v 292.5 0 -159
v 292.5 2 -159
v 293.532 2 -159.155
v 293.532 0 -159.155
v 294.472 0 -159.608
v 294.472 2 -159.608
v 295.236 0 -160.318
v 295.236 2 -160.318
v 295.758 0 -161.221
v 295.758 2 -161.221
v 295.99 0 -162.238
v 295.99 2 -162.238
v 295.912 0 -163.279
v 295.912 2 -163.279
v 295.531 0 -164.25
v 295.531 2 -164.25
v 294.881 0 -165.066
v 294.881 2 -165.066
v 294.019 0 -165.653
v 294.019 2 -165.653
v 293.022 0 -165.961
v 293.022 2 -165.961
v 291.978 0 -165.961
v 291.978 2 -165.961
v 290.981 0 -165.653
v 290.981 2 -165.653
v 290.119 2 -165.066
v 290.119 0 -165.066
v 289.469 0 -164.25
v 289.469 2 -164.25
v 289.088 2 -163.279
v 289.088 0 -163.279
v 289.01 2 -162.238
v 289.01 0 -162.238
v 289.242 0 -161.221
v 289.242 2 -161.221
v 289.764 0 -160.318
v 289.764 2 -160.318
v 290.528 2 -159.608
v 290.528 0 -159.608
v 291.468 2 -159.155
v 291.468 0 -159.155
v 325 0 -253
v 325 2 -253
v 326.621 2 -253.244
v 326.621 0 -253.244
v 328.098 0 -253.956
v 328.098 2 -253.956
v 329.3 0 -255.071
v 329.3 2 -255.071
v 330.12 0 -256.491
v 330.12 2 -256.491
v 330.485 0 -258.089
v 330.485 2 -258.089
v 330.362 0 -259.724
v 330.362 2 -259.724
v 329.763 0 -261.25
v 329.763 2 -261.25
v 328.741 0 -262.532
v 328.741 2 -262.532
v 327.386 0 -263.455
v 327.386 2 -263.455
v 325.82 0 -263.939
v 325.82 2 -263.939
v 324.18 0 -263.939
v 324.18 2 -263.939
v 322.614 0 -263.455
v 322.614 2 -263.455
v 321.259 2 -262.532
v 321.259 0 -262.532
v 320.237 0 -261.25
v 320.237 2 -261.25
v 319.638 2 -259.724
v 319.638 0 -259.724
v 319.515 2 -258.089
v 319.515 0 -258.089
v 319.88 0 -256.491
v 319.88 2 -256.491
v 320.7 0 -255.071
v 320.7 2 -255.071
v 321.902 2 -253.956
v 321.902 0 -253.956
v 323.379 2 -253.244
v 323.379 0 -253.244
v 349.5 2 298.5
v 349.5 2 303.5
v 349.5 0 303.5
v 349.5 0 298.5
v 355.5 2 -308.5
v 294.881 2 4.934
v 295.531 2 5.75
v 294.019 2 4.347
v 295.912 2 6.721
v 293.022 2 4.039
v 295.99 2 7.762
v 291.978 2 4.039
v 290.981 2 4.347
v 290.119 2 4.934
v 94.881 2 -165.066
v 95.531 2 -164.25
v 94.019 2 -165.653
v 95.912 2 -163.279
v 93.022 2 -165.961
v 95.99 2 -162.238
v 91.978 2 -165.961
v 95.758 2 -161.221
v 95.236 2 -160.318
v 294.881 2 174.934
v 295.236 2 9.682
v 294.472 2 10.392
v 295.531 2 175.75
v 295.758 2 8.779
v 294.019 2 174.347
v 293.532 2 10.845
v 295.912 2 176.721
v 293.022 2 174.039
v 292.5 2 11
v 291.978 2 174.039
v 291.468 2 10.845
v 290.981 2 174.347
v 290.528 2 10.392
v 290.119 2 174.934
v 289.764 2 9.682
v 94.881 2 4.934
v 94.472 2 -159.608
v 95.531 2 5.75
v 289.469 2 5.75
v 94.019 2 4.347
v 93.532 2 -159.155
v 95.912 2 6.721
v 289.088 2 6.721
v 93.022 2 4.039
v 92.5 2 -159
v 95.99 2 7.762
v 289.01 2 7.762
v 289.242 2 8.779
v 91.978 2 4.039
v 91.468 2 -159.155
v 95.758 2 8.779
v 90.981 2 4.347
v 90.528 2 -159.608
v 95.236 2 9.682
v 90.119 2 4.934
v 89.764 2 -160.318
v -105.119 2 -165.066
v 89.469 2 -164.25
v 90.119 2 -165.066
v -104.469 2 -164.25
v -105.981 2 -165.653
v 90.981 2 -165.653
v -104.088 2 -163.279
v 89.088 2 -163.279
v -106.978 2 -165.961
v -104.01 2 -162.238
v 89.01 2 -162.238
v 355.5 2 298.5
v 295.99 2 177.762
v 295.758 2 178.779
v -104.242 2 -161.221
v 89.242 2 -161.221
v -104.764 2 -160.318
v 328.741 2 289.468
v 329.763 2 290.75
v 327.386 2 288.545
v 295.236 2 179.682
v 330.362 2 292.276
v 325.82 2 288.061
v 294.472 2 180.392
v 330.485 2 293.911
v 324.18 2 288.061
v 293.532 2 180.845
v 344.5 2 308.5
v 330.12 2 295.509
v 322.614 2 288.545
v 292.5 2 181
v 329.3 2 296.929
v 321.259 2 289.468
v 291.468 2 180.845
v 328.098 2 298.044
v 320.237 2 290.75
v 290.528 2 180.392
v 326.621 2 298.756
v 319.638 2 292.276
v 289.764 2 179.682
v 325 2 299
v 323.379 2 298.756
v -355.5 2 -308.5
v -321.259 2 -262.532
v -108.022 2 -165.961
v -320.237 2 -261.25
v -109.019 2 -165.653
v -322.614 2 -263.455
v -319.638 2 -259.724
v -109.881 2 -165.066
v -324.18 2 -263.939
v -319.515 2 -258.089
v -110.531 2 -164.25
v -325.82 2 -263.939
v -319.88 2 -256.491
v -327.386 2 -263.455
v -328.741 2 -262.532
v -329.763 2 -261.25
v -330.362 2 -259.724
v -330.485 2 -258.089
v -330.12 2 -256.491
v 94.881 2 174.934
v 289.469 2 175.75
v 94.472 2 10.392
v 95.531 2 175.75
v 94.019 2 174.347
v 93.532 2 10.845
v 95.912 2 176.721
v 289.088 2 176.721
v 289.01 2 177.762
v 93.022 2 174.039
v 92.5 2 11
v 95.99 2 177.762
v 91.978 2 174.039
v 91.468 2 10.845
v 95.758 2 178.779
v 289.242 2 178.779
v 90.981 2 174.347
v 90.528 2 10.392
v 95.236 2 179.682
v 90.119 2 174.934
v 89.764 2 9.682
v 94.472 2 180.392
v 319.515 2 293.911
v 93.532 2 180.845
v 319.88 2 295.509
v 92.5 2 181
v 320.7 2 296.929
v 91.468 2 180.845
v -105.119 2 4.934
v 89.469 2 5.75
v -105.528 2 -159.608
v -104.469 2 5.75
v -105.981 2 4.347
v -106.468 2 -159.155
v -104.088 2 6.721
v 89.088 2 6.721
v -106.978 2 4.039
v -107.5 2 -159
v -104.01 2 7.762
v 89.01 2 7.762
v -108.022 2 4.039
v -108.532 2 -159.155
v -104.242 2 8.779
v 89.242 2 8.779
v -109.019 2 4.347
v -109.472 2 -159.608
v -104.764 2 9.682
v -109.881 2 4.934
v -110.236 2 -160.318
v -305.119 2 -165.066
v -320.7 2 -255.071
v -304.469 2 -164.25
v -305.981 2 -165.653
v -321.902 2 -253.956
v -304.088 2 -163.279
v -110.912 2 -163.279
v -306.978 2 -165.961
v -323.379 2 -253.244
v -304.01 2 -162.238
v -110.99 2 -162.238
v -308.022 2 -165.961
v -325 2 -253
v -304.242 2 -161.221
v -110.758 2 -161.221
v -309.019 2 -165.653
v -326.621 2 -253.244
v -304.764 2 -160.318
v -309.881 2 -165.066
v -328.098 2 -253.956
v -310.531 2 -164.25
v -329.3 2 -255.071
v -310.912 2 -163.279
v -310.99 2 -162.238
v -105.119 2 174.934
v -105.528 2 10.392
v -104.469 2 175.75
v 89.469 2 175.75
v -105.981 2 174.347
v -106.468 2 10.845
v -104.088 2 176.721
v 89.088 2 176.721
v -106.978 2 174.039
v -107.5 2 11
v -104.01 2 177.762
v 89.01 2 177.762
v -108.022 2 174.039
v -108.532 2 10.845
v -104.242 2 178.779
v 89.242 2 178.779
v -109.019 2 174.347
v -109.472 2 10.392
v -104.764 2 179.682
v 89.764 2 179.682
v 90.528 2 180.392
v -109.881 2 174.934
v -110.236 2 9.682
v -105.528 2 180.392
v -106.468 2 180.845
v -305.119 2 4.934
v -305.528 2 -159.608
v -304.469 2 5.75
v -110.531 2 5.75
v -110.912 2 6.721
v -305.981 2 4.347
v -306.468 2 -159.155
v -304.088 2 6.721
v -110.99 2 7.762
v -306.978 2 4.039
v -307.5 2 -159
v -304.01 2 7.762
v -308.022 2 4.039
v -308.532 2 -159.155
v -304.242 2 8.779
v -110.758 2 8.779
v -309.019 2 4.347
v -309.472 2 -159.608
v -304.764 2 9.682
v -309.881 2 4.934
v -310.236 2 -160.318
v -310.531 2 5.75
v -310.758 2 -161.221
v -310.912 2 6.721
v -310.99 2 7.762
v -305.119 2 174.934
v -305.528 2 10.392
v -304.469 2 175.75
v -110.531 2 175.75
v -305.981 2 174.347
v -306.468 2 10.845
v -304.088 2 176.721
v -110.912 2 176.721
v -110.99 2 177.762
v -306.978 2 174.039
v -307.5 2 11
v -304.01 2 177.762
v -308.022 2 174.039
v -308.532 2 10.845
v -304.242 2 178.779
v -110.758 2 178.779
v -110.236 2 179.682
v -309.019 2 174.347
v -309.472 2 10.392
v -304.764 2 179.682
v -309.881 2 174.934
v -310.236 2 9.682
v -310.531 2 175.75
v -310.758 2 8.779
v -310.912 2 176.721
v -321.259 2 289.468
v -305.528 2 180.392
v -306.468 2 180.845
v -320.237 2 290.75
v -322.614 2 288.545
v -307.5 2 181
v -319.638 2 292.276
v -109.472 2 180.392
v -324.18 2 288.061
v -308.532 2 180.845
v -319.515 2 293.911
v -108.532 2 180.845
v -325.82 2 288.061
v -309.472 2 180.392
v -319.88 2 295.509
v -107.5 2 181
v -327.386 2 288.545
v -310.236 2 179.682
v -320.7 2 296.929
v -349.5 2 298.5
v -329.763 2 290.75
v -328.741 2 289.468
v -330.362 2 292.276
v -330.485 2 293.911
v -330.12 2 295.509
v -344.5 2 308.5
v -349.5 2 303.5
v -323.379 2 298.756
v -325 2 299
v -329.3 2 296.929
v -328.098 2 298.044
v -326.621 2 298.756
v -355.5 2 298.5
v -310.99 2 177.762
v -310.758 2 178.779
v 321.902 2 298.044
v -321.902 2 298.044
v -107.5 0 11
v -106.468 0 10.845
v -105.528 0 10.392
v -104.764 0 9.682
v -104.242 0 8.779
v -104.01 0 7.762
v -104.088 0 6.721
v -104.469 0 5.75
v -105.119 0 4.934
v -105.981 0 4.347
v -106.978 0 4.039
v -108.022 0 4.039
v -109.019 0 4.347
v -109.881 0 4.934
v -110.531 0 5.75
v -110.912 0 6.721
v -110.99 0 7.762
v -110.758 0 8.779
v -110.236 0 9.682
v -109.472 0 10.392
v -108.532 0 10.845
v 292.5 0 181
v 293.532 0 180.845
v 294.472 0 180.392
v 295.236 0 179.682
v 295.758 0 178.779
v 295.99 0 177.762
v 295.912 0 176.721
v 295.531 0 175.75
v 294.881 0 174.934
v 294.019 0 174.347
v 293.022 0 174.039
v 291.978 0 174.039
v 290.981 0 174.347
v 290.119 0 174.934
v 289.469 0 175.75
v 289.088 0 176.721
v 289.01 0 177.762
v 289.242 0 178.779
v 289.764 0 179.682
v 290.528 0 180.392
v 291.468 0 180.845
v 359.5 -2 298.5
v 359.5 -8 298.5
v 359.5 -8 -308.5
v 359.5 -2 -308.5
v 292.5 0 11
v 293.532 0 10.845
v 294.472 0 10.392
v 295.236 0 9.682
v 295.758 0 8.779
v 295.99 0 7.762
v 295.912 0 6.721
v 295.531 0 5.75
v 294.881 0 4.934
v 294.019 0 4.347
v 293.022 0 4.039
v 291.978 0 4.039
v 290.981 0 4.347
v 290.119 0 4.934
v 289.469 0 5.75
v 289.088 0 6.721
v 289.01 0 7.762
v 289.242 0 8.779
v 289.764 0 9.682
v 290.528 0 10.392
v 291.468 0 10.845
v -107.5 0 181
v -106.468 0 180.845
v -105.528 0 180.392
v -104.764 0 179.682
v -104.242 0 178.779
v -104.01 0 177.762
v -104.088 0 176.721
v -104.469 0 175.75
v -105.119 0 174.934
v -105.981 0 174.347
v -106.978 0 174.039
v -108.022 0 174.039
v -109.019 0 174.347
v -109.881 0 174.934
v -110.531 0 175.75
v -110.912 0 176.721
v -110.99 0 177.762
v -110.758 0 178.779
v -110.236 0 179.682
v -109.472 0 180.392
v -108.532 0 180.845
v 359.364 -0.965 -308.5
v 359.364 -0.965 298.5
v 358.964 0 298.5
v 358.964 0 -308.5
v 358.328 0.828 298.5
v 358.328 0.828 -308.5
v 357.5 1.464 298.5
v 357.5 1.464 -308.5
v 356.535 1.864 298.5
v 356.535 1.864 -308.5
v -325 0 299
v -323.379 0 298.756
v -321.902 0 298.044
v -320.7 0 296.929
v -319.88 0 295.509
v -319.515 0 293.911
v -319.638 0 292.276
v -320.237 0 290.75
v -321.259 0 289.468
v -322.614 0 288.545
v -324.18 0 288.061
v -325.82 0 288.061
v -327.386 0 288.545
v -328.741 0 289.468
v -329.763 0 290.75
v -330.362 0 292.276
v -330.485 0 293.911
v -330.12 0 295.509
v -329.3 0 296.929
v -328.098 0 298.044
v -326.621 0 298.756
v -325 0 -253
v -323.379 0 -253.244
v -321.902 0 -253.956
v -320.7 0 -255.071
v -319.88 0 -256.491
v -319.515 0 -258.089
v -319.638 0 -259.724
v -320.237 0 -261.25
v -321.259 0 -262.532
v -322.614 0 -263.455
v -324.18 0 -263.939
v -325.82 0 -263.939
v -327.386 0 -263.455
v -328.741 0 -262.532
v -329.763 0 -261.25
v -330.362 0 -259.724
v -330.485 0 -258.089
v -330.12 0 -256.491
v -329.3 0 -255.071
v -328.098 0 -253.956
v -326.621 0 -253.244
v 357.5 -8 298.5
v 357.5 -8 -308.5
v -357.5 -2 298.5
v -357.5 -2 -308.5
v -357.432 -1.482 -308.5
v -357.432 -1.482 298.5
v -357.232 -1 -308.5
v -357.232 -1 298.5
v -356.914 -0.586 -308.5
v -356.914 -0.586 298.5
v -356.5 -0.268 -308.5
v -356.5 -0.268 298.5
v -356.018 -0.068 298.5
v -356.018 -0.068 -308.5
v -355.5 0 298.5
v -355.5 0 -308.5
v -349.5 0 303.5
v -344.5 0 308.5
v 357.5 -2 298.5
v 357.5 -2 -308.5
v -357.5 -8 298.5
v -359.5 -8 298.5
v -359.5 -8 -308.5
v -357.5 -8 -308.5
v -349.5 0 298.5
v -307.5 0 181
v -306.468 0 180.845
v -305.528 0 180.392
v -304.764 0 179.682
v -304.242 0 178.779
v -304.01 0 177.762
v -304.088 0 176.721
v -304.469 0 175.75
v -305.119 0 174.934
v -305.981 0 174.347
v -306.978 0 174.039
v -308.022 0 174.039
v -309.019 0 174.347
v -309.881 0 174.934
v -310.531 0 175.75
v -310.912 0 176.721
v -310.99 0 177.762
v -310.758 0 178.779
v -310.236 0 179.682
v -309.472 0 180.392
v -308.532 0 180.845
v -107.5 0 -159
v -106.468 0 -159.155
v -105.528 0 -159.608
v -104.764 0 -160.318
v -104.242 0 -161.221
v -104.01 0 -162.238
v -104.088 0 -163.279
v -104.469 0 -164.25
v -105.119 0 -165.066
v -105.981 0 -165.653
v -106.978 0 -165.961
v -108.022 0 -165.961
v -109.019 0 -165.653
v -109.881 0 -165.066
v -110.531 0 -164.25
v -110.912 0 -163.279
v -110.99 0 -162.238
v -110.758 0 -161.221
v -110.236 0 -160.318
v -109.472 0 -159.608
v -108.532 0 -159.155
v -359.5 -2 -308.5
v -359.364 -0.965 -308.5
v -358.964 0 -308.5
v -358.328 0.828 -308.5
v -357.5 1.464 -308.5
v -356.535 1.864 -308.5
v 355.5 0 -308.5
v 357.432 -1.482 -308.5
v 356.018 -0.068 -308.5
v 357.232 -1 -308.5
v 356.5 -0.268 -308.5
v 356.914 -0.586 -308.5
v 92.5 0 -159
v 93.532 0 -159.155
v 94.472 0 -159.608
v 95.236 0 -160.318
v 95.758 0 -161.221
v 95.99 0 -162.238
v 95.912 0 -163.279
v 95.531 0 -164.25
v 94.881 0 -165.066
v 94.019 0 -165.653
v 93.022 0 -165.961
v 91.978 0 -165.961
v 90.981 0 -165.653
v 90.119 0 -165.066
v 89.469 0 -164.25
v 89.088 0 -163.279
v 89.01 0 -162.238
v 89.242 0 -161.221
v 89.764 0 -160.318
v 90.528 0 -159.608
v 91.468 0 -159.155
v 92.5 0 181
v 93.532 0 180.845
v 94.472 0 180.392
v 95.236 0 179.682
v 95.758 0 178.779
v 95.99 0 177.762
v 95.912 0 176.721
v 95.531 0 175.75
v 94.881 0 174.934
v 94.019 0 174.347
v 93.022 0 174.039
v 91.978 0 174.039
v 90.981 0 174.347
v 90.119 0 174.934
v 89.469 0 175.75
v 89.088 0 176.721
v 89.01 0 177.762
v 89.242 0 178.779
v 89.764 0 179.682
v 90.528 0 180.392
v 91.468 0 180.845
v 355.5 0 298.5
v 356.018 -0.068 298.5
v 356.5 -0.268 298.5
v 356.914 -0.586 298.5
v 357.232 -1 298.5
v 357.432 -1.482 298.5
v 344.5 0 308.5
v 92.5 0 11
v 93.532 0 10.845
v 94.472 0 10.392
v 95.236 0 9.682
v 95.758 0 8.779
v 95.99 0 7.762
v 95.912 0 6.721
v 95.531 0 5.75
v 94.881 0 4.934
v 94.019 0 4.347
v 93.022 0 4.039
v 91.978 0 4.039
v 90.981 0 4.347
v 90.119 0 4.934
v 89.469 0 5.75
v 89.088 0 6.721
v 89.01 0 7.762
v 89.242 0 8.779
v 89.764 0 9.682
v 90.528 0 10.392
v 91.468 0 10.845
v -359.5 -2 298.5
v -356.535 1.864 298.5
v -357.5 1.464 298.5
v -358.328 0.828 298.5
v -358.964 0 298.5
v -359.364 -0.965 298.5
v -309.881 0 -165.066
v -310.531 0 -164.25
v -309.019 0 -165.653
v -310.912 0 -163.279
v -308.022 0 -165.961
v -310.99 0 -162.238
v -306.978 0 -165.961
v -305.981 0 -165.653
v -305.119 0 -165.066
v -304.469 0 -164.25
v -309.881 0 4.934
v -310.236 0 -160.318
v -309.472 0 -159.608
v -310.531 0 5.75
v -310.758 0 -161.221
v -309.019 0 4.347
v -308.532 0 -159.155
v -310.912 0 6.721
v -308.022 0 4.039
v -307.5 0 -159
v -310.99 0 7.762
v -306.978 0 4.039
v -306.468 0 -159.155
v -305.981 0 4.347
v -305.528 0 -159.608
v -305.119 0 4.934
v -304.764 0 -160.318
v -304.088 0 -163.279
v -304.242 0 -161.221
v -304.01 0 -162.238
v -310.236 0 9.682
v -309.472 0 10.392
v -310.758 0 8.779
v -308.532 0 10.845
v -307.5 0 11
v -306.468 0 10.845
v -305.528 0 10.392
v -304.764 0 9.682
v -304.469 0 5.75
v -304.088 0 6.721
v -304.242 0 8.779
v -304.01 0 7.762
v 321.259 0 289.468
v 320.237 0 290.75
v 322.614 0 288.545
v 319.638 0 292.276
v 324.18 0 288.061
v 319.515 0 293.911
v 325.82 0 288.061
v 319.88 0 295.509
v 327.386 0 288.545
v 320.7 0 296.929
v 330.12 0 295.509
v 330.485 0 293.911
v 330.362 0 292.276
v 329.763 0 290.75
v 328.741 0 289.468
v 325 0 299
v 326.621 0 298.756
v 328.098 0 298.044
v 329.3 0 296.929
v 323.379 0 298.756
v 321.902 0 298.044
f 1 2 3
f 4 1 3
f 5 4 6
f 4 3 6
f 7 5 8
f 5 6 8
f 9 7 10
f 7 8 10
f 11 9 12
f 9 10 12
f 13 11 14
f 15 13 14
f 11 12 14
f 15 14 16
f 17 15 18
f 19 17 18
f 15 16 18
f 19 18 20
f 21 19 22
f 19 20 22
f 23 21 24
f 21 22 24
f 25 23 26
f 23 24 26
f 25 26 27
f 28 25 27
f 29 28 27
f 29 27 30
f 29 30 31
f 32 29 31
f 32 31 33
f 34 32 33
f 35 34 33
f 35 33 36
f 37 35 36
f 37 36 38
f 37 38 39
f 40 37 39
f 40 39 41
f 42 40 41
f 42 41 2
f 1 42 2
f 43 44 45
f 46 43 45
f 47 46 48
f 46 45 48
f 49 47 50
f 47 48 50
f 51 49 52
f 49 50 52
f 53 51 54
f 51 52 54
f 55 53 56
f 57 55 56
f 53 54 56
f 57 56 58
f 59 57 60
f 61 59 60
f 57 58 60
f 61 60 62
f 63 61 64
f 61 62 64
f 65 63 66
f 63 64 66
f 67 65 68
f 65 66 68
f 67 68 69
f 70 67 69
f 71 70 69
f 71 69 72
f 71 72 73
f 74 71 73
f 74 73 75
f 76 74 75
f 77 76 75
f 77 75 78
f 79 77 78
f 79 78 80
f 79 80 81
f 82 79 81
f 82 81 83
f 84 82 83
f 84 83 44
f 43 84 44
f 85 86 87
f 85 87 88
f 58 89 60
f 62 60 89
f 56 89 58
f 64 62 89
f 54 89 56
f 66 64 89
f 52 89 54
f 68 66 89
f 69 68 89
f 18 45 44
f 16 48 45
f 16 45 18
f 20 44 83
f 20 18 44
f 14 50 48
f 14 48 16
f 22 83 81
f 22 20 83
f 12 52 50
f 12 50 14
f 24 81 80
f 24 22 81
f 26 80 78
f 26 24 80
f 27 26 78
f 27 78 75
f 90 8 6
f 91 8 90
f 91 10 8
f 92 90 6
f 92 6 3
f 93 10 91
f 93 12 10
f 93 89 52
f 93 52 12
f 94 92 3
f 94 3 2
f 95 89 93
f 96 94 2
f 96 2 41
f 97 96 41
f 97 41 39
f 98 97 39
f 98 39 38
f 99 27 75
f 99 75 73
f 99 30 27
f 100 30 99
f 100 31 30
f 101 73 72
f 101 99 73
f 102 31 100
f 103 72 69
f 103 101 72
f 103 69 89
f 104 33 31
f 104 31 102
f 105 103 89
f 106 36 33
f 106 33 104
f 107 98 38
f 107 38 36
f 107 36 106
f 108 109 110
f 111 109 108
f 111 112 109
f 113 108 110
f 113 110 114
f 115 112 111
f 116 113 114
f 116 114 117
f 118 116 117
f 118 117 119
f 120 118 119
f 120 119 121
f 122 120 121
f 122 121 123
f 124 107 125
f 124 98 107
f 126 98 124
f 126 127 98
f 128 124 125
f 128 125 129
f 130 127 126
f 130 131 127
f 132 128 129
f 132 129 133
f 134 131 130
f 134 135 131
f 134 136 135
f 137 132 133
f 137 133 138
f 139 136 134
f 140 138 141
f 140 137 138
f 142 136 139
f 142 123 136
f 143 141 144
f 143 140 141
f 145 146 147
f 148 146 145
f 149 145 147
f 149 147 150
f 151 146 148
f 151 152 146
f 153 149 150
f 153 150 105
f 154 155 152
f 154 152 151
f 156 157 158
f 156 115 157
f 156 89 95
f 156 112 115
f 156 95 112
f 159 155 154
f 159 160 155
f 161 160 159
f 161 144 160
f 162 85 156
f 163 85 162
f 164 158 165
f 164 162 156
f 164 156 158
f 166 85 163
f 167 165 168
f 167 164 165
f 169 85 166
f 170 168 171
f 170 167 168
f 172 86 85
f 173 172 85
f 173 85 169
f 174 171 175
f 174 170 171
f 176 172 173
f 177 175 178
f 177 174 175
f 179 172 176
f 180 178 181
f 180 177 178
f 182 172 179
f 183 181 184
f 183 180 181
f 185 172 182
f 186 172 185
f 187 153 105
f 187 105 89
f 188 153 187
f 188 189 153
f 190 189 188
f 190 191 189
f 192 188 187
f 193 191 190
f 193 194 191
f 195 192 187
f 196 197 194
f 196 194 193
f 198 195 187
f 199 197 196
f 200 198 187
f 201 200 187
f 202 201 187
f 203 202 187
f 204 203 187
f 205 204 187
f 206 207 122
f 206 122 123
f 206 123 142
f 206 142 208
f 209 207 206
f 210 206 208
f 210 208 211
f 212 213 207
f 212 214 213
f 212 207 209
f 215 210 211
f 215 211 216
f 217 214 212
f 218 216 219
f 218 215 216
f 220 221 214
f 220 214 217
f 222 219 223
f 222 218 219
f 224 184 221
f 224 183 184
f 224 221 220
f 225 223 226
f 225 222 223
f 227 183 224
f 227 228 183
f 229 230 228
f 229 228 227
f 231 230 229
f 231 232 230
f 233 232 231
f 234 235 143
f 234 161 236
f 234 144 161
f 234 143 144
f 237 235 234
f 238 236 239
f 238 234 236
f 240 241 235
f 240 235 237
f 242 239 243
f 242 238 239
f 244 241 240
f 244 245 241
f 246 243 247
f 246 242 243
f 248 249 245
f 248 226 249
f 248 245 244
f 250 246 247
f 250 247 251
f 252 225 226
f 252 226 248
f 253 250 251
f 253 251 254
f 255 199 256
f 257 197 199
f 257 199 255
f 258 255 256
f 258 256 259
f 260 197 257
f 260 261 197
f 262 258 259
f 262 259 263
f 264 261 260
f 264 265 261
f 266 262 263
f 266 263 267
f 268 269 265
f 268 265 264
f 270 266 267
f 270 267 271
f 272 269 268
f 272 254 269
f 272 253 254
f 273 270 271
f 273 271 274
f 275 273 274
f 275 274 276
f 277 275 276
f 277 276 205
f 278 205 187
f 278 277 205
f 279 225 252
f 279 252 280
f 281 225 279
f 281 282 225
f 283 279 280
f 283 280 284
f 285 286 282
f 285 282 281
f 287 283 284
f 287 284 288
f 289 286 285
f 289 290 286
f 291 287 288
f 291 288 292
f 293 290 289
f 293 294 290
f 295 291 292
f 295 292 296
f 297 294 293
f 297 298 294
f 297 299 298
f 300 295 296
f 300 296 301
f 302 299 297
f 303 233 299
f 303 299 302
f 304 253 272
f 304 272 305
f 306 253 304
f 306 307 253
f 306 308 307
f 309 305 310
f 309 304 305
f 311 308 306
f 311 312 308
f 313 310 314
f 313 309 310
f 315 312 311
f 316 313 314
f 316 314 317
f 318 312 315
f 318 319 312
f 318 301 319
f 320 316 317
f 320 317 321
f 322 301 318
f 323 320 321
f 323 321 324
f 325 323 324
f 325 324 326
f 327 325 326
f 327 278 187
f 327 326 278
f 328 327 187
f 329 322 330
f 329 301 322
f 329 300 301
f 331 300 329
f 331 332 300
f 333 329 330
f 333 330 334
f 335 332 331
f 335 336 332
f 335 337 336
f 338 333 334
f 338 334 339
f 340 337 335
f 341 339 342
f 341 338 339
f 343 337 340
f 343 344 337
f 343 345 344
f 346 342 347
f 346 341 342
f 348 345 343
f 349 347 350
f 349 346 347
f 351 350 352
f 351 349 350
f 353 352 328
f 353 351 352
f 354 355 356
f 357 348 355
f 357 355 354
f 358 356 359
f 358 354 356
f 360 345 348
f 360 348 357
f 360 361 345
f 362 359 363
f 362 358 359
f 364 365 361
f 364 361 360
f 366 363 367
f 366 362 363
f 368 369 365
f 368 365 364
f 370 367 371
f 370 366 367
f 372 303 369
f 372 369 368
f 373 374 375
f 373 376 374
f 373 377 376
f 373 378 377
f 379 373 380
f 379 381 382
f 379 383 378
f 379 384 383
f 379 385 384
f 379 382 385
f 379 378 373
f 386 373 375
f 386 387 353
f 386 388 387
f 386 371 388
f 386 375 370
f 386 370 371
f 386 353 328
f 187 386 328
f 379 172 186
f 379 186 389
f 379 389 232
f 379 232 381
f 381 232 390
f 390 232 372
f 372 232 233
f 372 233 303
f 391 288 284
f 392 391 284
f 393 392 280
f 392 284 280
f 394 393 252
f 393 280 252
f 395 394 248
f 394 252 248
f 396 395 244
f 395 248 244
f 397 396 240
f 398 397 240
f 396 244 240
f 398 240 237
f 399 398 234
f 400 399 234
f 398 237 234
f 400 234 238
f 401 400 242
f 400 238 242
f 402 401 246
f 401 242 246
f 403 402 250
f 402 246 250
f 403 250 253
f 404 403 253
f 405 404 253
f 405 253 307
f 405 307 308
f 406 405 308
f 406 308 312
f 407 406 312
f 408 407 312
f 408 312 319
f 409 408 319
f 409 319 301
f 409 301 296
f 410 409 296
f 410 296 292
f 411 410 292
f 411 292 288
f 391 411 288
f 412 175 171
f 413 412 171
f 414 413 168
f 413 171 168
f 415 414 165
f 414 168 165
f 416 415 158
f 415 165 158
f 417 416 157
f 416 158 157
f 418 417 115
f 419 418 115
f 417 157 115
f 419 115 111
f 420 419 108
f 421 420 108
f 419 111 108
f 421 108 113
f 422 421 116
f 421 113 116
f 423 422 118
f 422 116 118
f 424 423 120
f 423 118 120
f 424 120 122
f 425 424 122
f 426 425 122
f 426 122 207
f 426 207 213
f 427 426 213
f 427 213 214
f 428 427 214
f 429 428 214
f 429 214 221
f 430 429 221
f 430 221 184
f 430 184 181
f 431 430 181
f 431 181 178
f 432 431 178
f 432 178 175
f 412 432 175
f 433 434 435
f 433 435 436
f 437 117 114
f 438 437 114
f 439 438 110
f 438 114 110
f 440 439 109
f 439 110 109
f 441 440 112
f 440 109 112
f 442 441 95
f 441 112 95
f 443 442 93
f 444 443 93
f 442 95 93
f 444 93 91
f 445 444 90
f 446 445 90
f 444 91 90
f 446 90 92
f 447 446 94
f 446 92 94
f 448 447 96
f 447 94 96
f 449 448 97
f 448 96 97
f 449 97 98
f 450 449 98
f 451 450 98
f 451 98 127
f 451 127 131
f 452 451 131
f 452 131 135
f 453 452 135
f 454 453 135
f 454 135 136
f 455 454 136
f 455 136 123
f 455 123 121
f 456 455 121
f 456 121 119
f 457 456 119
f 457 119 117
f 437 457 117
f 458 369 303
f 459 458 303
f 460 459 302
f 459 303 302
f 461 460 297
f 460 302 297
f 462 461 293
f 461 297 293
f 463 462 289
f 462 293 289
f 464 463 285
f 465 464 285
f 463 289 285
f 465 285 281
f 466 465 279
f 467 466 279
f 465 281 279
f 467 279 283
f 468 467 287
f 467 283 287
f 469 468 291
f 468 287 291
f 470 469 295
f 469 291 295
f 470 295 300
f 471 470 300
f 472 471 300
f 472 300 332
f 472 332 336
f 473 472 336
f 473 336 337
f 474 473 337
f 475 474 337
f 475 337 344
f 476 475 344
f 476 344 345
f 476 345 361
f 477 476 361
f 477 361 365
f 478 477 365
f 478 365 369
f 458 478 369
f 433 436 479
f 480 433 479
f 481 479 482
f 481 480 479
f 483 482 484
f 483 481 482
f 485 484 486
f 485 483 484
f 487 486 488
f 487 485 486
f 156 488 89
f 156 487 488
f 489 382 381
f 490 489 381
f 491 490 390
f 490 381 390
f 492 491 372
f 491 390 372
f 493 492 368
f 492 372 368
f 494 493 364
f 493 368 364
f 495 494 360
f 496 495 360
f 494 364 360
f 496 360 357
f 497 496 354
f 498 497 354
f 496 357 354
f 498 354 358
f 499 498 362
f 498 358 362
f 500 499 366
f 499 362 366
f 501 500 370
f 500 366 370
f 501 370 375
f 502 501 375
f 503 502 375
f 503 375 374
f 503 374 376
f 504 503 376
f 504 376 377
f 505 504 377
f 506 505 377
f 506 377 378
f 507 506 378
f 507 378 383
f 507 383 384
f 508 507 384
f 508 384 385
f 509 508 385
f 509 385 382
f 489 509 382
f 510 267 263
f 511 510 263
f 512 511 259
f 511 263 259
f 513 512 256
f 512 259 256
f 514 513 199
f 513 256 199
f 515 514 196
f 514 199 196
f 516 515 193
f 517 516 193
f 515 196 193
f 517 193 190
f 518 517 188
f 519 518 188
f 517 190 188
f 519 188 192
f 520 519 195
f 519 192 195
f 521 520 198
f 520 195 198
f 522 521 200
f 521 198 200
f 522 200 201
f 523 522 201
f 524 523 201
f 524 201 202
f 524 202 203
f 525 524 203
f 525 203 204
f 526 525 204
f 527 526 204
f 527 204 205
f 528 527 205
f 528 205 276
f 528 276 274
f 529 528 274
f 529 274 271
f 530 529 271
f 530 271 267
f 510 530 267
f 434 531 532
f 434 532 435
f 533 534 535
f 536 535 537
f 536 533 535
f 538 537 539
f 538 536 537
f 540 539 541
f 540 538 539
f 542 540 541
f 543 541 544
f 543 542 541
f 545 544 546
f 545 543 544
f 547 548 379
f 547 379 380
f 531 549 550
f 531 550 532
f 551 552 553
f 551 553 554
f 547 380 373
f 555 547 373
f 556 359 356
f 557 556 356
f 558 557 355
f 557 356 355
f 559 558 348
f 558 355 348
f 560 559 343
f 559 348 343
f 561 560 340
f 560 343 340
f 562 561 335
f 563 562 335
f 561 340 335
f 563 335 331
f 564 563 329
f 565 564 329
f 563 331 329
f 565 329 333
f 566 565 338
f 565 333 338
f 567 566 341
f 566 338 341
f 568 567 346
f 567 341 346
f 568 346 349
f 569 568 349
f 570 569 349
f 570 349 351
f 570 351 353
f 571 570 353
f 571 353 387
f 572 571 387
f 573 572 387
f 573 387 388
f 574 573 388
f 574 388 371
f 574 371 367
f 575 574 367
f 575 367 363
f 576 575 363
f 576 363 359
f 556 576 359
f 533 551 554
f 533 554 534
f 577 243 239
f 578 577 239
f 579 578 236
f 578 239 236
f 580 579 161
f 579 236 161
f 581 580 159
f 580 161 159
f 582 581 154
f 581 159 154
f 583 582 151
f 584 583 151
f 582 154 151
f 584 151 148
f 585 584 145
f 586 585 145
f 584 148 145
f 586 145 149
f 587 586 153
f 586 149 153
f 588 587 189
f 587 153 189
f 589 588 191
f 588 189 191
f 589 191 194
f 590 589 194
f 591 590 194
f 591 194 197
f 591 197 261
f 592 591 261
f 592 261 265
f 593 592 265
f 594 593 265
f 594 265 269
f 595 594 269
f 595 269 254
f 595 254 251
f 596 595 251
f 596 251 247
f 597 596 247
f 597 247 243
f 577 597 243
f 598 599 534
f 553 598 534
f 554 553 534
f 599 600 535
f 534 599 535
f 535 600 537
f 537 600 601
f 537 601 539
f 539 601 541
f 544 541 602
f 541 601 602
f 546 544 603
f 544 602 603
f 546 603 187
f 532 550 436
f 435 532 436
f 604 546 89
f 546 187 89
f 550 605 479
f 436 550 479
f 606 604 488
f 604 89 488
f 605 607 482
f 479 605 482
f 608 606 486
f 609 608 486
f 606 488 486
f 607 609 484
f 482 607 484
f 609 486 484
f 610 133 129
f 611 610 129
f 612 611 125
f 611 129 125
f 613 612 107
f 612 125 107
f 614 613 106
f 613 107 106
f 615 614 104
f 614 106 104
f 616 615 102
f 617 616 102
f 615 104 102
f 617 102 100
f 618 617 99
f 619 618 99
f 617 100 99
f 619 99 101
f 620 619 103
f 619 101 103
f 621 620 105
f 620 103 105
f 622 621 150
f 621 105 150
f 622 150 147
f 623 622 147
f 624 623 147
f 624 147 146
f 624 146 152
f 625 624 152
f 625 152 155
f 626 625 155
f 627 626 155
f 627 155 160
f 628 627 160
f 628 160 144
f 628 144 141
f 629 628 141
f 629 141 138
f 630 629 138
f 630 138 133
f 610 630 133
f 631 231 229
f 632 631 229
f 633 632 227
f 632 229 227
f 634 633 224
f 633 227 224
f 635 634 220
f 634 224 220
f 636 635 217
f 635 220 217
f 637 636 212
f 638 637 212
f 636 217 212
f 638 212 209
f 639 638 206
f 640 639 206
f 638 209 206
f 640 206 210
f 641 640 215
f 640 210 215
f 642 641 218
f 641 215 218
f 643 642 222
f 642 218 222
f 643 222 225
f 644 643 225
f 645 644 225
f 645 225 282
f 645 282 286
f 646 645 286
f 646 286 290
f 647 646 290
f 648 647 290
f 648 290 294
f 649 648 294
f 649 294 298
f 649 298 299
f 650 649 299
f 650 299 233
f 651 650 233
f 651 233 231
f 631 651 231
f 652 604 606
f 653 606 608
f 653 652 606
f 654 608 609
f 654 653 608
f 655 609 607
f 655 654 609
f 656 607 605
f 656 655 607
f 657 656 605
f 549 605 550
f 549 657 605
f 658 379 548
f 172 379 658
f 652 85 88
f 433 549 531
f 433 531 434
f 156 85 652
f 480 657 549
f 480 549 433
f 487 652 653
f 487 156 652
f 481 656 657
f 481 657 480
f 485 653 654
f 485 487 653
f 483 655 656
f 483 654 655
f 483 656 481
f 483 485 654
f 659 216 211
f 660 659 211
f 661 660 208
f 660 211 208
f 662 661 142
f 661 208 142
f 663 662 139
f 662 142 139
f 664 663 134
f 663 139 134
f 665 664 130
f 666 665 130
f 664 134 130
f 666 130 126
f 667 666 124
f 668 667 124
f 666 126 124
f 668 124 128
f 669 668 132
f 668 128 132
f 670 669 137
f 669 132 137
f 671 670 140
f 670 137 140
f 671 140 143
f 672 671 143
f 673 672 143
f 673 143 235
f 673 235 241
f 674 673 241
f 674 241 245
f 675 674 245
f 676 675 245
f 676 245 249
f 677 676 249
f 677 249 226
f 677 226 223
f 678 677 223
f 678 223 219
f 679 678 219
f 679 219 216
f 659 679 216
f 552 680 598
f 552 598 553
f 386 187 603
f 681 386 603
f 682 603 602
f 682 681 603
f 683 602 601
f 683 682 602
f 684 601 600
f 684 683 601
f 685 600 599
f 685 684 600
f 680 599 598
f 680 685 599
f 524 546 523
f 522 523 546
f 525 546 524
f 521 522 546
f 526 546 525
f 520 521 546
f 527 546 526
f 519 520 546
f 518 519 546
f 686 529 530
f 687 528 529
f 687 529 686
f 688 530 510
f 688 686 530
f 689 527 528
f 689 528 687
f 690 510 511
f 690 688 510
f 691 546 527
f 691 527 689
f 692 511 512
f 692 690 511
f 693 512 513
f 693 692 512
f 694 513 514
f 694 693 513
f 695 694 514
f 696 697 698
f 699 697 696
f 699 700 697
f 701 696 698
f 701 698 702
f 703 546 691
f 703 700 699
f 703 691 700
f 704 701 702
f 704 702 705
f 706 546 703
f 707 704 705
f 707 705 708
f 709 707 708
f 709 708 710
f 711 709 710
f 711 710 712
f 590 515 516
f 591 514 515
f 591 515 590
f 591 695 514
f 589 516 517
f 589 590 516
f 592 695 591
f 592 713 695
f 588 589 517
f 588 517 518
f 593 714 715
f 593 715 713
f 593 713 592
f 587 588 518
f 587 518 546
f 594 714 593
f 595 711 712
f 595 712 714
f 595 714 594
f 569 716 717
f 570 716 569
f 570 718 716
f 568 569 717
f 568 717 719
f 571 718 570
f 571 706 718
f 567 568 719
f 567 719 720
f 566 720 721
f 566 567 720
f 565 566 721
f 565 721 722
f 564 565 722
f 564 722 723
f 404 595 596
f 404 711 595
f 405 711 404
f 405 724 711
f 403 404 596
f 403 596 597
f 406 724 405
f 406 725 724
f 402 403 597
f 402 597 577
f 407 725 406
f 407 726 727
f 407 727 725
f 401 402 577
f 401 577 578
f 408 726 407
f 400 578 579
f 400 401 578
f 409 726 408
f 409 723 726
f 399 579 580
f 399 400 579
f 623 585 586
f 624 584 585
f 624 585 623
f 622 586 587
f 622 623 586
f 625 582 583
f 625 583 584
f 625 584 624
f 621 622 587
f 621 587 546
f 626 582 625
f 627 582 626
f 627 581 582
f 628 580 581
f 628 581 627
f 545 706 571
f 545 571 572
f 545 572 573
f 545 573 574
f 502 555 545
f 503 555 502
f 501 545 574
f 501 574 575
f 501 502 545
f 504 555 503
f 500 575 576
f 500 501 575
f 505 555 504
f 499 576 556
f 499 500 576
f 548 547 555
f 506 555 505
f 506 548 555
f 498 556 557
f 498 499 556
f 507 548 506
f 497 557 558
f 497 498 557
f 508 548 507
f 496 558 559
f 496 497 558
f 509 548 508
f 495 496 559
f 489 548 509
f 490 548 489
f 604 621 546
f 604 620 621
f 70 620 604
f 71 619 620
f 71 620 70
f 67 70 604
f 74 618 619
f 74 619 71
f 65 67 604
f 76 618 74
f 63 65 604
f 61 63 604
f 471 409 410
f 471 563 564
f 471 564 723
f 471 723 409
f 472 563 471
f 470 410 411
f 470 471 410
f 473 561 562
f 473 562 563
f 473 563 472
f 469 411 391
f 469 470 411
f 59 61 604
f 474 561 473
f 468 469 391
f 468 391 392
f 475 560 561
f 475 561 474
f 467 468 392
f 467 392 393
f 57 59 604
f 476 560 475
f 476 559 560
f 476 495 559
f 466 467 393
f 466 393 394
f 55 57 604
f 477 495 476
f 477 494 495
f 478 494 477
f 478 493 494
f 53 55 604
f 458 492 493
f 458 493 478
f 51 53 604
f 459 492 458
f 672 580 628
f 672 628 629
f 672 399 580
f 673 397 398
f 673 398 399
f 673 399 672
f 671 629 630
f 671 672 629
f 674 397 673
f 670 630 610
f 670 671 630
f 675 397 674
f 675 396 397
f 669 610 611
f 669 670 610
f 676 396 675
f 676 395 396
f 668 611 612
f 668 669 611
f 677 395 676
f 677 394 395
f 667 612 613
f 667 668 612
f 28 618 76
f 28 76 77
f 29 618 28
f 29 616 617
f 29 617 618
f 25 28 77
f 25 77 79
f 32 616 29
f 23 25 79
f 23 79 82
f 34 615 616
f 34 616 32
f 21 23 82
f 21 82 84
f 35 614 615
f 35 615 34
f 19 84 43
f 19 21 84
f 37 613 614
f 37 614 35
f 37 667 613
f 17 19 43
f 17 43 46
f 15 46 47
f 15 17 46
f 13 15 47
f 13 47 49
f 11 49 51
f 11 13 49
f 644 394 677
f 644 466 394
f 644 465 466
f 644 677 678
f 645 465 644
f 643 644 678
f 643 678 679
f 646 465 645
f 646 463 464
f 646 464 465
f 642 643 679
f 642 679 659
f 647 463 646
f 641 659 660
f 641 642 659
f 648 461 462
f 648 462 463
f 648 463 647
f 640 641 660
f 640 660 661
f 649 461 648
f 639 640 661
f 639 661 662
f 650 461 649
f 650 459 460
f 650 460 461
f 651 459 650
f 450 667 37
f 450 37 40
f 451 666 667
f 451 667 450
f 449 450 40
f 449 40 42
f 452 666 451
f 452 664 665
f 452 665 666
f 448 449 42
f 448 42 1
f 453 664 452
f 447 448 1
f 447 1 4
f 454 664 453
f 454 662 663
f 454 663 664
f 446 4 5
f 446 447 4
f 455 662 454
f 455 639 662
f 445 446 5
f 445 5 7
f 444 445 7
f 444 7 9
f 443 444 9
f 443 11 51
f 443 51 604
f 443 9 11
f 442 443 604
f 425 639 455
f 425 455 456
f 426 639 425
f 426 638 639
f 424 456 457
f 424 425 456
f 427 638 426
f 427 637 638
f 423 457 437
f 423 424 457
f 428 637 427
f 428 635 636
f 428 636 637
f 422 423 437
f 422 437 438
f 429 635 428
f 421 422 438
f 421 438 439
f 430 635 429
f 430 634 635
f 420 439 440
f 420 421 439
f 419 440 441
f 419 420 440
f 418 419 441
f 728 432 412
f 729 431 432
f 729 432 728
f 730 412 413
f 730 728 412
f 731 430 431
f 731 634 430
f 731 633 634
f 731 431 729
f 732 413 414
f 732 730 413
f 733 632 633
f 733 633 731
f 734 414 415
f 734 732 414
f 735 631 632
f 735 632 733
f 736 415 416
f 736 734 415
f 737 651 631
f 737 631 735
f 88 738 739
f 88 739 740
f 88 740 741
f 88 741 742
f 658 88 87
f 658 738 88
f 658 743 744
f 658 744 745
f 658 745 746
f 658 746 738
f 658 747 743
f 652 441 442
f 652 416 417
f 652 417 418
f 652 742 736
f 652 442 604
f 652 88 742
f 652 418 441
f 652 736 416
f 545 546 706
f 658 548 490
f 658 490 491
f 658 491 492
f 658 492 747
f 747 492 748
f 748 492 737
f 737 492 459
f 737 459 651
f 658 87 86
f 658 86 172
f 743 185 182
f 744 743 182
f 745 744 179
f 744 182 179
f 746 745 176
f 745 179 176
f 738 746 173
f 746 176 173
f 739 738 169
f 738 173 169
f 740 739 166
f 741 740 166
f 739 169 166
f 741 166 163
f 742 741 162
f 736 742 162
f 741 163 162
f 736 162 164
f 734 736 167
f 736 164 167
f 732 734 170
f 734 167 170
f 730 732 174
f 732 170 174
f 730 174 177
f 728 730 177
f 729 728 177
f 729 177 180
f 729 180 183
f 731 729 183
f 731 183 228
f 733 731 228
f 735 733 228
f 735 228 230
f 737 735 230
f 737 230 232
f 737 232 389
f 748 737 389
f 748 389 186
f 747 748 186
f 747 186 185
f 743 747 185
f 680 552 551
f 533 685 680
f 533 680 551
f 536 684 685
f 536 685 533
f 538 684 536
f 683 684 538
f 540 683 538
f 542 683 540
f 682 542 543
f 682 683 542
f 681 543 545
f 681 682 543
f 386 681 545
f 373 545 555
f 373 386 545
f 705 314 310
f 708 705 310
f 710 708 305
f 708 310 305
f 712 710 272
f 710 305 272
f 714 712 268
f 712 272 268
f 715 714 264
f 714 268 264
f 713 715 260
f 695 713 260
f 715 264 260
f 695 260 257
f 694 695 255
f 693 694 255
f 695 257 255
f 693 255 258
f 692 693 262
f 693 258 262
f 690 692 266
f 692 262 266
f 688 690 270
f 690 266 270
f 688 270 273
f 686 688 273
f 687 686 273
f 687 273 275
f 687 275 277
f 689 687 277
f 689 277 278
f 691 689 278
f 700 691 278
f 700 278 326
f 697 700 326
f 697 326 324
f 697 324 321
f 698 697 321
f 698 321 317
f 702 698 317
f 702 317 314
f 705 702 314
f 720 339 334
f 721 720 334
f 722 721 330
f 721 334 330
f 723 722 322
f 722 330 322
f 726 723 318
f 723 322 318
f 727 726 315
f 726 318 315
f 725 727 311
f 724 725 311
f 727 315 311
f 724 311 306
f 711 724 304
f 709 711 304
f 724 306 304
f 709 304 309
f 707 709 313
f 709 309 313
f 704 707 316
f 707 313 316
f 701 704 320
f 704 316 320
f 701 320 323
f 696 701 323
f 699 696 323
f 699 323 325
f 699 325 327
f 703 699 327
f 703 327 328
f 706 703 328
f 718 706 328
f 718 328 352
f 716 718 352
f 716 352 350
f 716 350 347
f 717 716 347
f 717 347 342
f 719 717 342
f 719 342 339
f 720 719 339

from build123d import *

# Parameters (mm, degrees)
SM_BASE_FLANGE_1_DEPTH = 308.5
SKETCH_6_W             = 10
SKETCH_6_H             = 10
CUT_EXTRUDE_1_DEPTH    = 474.827500257
OTHER_1_DEPTH          = 2
SKETCH_7_R             = 5.5
CUT_EXTRUDE_2_DEPTH    = 10
SKETCH_8_R             = 3.5
CUT_EXTRUDE_3_DEPTH    = 10


# Read off the part's stored shape, not the designer's step: Затупленный угол1
# Sheet-metal steps are written as plain solids
with BuildPart() as part:
    # Sketch 1 → Базовая кромка1 (new, symmetric)
    with BuildSketch(Plane.XY):
        with BuildLine():
            Line((-357.5, -8), (-357.5, -2))
            ThreePointArc((-357.5, -2), (-356.914213562, -0.585786438), (-355.5, 0))
            Line((-355.5, 0), (355.5, 0))
            ThreePointArc((355.5, 0), (356.914213562, -0.585786438), (357.5, -2))
            Line((357.5, -2), (357.5, -8))
            Line((357.5, -8), (359.5, -8))
            Line((359.5, -8), (359.5, -2))
            ThreePointArc((359.5, -2), (358.328427125, 0.828427125), (355.5, 2))
            Line((355.5, 2), (-355.5, 2))
            ThreePointArc((-355.5, 2), (-358.328427125, 0.828427125), (-359.5, -2))
            Line((-359.5, -2), (-359.5, -8))
            Line((-359.5, -8), (-357.5, -8))
        make_face()
    extrude(amount=SM_BASE_FLANGE_1_DEPTH, both=True)

    # Эскиз6 → Вырез-Вытянуть1 (cut, through all)
    with BuildSketch(Plane(origin=(0, 2, 0), x_dir=(1, 0, 0), z_dir=(0, 1, 0))):
        with Locations((-354.5, -303.5)):
            Rectangle(SKETCH_6_W, SKETCH_6_H)
        with Locations((354.5, -303.5)):
            Rectangle(SKETCH_6_W, SKETCH_6_H)
    extrude(amount=-CUT_EXTRUDE_1_DEPTH, mode=Mode.SUBTRACT)

    # Other 1 outline → Other 1 (cut)
    with BuildSketch(Plane(origin=(0, 0, 0), x_dir=(1, 0, 0), z_dir=(0, 1, 0))):
        Polygon((-349.5, -308.5), (-344.5, -308.5), (-349.5, -303.5), align=None)
        Polygon((349.5, -303.5), (344.5, -308.5), (349.5, -308.5), align=None)
    extrude(amount=OTHER_1_DEPTH, mode=Mode.SUBTRACT)

    # Эскиз7 → Вырез-Вытянуть2 (cut)
    with BuildSketch(Plane(origin=(0, 2, 0), x_dir=(1, 0, 0), z_dir=(0, 1, 0))):
        with Locations(Location((325, -293.5, 0), (0, 0, 270))):
            Circle(SKETCH_7_R)
        with Locations(Location((-325, -293.5, 0), (0, 0, 270))):
            Circle(SKETCH_7_R)
        with Locations(Location((-325, 258.5, 0), (0, 0, 270))):
            Circle(SKETCH_7_R)
        with Locations(Location((325, 258.5, 0), (0, 0, 270))):
            Circle(SKETCH_7_R)
    extrude(amount=-CUT_EXTRUDE_2_DEPTH, mode=Mode.SUBTRACT)

    # Эскиз8 → Вырез-Вытянуть3 (cut)
    with BuildSketch(Plane(origin=(0, 2, 0), x_dir=(1, 0, 0), z_dir=(0, 1, 0))):
        with Locations(Location((292.5, 162.5, 0), (0, 0, 270))):
            Circle(SKETCH_8_R)
        with Locations(Location((92.5, 162.5, 0), (0, 0, 270))):
            Circle(SKETCH_8_R)
        with Locations(Location((-107.5, 162.5, 0), (0, 0, 270))):
            Circle(SKETCH_8_R)
        with Locations(Location((-307.5, 162.5, 0), (0, 0, 270))):
            Circle(SKETCH_8_R)
        with Locations(Location((92.5, -7.5, 0), (0, 0, 270))):
            Circle(SKETCH_8_R)
        with Locations(Location((-107.5, -7.5, 0), (0, 0, 270))):
            Circle(SKETCH_8_R)
        with Locations(Location((-307.5, -7.5, 0), (0, 0, 270))):
            Circle(SKETCH_8_R)
        with Locations(Location((92.5, -177.5, 0), (0, 0, 270))):
            Circle(SKETCH_8_R)
        with Locations(Location((-107.5, -177.5, 0), (0, 0, 270))):
            Circle(SKETCH_8_R)
        with Locations(Location((-307.5, -177.5, 0), (0, 0, 270))):
            Circle(SKETCH_8_R)
        with Locations(Location((292.5, -7.5, 0), (0, 0, 270))):
            Circle(SKETCH_8_R)
        with Locations(Location((292.5, -177.5, 0), (0, 0, 270))):
            Circle(SKETCH_8_R)
    extrude(amount=-CUT_EXTRUDE_3_DEPTH, mode=Mode.SUBTRACT)


solid = part.part
